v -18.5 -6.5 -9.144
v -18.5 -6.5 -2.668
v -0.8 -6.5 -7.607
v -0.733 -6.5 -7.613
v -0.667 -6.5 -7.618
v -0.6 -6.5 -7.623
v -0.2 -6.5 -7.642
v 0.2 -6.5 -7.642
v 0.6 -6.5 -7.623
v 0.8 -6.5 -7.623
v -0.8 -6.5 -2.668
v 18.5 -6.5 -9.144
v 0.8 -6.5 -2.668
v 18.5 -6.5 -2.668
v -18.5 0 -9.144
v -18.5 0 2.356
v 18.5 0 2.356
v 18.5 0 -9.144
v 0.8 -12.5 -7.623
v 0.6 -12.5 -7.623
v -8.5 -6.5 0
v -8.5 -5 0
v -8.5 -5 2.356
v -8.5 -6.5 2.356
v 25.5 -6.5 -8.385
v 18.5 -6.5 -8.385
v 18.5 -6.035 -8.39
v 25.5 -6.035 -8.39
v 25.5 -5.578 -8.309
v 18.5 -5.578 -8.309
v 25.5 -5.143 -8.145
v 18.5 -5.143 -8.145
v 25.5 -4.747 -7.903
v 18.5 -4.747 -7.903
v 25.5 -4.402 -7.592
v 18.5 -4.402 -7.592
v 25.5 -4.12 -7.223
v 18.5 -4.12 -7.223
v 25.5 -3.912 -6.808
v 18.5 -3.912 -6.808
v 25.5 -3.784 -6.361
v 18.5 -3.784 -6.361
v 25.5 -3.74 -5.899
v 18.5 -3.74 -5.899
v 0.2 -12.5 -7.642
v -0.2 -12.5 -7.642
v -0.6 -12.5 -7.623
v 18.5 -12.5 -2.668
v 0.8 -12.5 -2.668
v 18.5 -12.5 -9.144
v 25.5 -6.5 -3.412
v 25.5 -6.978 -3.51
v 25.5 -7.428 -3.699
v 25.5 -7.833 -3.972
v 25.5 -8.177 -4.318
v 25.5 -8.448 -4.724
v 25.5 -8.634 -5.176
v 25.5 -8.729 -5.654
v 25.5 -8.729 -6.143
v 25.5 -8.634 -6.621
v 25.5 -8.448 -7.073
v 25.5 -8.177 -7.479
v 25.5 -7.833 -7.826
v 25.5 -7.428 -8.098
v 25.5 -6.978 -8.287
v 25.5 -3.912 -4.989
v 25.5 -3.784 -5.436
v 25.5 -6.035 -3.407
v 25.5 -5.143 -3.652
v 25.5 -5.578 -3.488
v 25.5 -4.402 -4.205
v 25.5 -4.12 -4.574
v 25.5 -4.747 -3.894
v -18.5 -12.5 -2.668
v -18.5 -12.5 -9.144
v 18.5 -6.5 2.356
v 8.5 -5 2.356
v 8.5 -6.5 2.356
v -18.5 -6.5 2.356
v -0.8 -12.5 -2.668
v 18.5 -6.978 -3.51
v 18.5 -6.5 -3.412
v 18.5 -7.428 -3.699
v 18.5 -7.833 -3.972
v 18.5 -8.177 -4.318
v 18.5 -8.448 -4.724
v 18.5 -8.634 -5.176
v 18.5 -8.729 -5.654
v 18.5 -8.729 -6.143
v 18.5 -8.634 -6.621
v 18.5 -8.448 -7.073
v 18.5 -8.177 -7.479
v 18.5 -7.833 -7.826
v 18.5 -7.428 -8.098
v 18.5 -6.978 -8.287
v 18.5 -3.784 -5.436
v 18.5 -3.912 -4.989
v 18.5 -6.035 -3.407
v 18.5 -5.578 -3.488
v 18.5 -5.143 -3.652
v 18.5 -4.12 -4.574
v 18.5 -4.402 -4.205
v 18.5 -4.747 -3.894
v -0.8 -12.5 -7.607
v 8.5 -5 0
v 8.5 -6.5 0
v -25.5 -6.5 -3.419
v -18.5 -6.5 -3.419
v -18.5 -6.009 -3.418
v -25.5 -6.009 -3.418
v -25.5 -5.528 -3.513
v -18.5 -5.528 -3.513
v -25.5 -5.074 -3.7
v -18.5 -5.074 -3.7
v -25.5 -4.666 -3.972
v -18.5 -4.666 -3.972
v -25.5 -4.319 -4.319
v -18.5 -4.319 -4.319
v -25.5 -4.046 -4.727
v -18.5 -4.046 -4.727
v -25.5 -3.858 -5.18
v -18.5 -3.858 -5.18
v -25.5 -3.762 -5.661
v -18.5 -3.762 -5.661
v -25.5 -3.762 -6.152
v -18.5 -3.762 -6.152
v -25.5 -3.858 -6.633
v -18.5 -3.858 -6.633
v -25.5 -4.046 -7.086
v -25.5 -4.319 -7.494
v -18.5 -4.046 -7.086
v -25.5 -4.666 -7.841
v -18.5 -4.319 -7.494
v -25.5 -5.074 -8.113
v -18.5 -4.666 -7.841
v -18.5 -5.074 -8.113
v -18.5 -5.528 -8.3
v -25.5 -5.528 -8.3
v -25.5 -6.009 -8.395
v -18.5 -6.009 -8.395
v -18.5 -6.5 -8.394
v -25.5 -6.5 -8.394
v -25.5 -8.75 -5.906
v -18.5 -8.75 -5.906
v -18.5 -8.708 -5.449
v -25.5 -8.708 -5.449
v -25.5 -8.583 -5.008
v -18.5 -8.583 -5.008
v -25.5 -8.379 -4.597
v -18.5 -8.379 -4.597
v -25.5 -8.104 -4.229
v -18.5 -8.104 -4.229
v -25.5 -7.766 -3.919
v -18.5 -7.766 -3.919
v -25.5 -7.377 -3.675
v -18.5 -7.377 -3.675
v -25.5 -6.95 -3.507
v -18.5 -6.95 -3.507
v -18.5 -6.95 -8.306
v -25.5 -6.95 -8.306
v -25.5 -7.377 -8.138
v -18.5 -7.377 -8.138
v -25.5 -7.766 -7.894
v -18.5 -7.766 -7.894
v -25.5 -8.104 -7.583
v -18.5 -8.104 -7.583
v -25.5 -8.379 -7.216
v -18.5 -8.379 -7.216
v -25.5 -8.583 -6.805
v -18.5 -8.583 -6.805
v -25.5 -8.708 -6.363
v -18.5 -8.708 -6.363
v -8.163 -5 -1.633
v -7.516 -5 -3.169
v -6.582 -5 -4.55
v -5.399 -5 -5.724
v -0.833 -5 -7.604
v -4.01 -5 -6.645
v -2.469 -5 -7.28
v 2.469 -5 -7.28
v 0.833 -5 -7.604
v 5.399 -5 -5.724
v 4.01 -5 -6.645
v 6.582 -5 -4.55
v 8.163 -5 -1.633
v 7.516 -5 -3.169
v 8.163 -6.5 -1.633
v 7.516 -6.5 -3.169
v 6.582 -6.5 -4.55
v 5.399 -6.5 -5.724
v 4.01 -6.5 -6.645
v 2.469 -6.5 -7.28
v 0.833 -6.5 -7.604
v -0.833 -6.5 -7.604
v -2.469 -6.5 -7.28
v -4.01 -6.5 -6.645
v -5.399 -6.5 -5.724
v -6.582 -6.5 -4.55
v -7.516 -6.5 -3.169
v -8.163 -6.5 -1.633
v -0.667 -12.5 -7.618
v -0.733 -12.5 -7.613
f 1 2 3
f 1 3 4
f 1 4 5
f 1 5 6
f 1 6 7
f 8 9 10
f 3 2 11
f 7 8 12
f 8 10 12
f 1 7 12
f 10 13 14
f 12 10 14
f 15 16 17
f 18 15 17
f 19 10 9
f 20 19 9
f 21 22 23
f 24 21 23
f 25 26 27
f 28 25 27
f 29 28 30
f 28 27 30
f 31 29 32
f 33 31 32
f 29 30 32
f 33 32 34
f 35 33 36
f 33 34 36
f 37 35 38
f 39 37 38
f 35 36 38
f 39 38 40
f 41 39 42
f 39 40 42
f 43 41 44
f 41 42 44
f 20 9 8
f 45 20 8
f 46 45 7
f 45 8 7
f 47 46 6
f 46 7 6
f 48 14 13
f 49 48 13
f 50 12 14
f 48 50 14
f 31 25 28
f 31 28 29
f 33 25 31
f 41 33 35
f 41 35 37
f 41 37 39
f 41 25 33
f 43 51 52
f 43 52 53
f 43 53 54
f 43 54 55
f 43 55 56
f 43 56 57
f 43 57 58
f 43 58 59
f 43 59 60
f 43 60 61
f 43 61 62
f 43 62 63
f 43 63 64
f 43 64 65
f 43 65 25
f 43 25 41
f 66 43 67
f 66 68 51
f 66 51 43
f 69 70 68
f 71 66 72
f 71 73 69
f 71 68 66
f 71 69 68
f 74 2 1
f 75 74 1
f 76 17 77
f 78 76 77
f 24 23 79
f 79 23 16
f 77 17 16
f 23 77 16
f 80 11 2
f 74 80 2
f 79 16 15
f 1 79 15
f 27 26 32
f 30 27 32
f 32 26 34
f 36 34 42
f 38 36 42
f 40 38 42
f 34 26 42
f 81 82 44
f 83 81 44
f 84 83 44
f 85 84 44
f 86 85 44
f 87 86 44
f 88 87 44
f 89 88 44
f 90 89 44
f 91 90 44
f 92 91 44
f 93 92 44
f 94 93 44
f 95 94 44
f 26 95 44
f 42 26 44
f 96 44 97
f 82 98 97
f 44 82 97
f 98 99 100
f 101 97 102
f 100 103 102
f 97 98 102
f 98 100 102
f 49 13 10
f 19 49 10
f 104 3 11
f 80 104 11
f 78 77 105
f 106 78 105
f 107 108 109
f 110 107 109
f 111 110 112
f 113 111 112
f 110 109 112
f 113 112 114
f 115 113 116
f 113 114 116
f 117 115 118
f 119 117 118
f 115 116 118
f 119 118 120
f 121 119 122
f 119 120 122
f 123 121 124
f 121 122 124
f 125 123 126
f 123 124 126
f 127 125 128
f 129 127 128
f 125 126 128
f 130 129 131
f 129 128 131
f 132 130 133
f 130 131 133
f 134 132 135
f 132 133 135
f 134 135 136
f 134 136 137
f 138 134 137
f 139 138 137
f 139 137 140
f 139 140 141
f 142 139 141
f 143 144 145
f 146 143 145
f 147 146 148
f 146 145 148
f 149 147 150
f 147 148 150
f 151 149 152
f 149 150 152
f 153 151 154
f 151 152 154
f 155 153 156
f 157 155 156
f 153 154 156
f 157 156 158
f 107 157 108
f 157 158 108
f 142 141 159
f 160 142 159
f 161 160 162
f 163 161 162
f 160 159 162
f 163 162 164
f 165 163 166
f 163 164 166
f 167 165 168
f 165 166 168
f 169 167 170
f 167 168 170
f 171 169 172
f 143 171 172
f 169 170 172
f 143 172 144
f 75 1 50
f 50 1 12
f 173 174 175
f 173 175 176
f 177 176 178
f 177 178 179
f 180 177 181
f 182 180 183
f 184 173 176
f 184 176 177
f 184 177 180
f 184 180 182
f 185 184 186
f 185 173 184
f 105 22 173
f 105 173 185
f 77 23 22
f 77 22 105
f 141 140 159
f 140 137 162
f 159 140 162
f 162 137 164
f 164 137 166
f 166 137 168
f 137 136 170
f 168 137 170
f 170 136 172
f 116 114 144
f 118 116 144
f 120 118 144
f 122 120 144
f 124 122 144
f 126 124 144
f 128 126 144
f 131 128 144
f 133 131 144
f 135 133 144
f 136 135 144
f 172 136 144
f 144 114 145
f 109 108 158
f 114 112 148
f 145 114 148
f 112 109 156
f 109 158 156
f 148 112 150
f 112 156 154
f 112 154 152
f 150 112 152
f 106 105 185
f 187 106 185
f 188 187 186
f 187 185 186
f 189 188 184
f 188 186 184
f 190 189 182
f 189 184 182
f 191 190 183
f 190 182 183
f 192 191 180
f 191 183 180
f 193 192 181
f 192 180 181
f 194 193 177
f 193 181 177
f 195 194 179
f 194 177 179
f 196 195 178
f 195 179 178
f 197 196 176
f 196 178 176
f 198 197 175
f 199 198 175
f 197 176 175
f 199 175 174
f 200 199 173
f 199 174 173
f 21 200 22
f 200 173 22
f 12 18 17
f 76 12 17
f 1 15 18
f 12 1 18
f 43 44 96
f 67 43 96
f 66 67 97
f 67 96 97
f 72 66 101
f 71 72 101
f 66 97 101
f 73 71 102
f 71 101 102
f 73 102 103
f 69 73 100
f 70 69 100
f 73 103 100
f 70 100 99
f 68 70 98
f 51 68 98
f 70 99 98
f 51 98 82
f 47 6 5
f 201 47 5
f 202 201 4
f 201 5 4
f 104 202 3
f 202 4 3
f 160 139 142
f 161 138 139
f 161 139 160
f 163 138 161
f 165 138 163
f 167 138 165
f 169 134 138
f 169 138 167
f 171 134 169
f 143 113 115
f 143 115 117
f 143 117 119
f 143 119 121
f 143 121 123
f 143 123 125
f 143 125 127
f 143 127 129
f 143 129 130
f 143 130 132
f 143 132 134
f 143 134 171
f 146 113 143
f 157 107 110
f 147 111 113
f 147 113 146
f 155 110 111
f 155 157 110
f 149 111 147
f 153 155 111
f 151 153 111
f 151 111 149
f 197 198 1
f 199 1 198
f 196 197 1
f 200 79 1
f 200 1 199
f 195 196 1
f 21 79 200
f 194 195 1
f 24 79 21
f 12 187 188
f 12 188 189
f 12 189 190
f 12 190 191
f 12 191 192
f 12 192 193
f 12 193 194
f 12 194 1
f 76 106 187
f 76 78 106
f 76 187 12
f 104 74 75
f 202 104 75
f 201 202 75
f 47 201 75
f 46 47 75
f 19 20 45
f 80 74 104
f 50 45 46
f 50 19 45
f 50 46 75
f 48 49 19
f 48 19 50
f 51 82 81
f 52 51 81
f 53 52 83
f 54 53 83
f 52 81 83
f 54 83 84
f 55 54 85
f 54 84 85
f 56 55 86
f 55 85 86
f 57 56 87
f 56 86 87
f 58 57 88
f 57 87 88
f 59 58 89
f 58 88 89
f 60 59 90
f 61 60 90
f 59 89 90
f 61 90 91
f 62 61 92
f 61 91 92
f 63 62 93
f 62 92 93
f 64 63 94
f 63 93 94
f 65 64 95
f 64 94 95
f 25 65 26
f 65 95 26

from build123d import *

# Parameters (mm, degrees)
F1_DEPTH = 5
F2_DEPTH = 6.5
F4_DEPTH = 6
F6_DEPTH = 7
F8_DEPTH = 7


with BuildPart() as f1:
    # F0 (on Front) → F1 (new body)
    with BuildSketch(Plane.XZ):
        with BuildLine():
            Line((-8.5, 2.3556), (-8.5, 0))
            ThreePointArc((-8.5, 0), (0, -7.6444), (8.5, 0))
            Line((8.5, 0), (8.5, 2.3556))
            Line((8.5, 2.3556), (-8.5, 2.3556))
        make_face()
    extrude(amount=F1_DEPTH)

    # F0 (on Front) → F2 (join)
    with BuildSketch(Plane.XZ):
        with BuildLine():
            ThreePointArc((8.5, 0), (0, -7.6444), (-8.5, 0))
            Line((-8.5, 0), (-8.5, 2.3556))
            Line((-8.5, 2.3556), (-18.5, 2.3556))
            Line((-18.5, 2.3556), (-18.5, -9.1444))
            Line((-18.5, -9.1444), (18.5, -9.1444))
            Line((18.5, -9.1444), (18.5, 2.3556))
            Line((18.5, 2.3556), (8.5, 2.3556))
            Line((8.5, 2.3556), (8.5, 0))
        make_face()
    extrude(amount=F2_DEPTH)


with BuildPart() as f4:
    # F3 (on face) → F4 (new body)
    with BuildSketch(Plane.XZ.offset(6.5)):
        with BuildLine():
            Line((-7.765819, -2.6684), (-18.5, -2.6684))
            Line((-18.5, -2.6684), (-18.5, -9.1444))
            Line((-18.5, -9.1444), (18.5, -9.1444))
            Line((18.5, -9.1444), (18.5, -2.6684))
            Line((18.5, -2.6684), (7.765819, -2.6684))
            ThreePointArc((7.765819, -2.6684), (4.94373, -6.06974), (0.8, -7.606881))
            Line((0.8, -7.606881), (0.8, -7.623304))
            Line((0.8, -7.623304), (0.600173, -7.623304))
            ThreePointArc((0.600173, -7.623304), (0, -7.6444), (-0.600173, -7.623304))
            ThreePointArc((-0.600173, -7.623304), (-0.700135, -7.615679), (-0.8, -7.606881))
            ThreePointArc((-0.8, -7.606881), (-4.94373, -6.06974), (-7.765819, -2.6684))
        make_face()
        with BuildLine():
            Line((-0.8, -2.6684), (-7.765819, -2.6684))
            ThreePointArc((-7.765819, -2.6684), (-4.94373, -6.06974), (-0.8, -7.606881))
            Line((-0.8, -7.606881), (-0.8, -2.6684))
        make_face()
        with BuildLine():
            ThreePointArc((0.8, -7.606881), (4.94373, -6.06974), (7.765819, -2.6684))
            Line((7.765819, -2.6684), (0.8, -2.6684))
            Line((0.8, -2.6684), (0.8, -7.606881))
        make_face()
    extrude(amount=F4_DEPTH)


with BuildPart() as f6:
    # F5 (on face) → F6 (new body)
    with BuildSketch(Plane.YZ.offset(18.5)):
        with BuildLine():
            Line((-6.5, -8.385049), (-6.5, -3.412058))
            ThreePointArc((-6.5, -3.412058), (-8.7405, -5.898553), (-6.5, -8.385049))
        make_face()
        with BuildLine():
            ThreePointArc((-6.5, -8.385049), (-4.566993, -7.755803), (-3.7405, -5.898553))
            ThreePointArc((-3.7405, -5.898553), (-4.566993, -4.041304), (-6.5, -3.412058))
            Line((-6.5, -3.412058), (-6.5, -8.385049))
        make_face()
    extrude(amount=F6_DEPTH)


with BuildPart() as f8:
    # F7 (on face) → F8 (new body)
    with BuildSketch(Plane(origin=(-18.5, 0, 0), x_dir=(0, -1, 0), z_dir=(-1, 0, 0))):
        with BuildLine():
            Line((6.5, -8.393869), (6.5, -3.418931))
            ThreePointArc((6.5, -3.418931), (3.75, -5.9064), (6.5, -8.393869))
        make_face()
        with BuildLine():
            ThreePointArc((6.5, -8.393869), (8.10405, -7.583451), (8.75, -5.9064))
            ThreePointArc((8.75, -5.9064), (8.10405, -4.229349), (6.5, -3.418931))
            Line((6.5, -3.418931), (6.5, -8.393869))
        make_face()
    extrude(amount=F8_DEPTH)


solid = Compound([f1.part, f4.part, f6.part, f8.part])
